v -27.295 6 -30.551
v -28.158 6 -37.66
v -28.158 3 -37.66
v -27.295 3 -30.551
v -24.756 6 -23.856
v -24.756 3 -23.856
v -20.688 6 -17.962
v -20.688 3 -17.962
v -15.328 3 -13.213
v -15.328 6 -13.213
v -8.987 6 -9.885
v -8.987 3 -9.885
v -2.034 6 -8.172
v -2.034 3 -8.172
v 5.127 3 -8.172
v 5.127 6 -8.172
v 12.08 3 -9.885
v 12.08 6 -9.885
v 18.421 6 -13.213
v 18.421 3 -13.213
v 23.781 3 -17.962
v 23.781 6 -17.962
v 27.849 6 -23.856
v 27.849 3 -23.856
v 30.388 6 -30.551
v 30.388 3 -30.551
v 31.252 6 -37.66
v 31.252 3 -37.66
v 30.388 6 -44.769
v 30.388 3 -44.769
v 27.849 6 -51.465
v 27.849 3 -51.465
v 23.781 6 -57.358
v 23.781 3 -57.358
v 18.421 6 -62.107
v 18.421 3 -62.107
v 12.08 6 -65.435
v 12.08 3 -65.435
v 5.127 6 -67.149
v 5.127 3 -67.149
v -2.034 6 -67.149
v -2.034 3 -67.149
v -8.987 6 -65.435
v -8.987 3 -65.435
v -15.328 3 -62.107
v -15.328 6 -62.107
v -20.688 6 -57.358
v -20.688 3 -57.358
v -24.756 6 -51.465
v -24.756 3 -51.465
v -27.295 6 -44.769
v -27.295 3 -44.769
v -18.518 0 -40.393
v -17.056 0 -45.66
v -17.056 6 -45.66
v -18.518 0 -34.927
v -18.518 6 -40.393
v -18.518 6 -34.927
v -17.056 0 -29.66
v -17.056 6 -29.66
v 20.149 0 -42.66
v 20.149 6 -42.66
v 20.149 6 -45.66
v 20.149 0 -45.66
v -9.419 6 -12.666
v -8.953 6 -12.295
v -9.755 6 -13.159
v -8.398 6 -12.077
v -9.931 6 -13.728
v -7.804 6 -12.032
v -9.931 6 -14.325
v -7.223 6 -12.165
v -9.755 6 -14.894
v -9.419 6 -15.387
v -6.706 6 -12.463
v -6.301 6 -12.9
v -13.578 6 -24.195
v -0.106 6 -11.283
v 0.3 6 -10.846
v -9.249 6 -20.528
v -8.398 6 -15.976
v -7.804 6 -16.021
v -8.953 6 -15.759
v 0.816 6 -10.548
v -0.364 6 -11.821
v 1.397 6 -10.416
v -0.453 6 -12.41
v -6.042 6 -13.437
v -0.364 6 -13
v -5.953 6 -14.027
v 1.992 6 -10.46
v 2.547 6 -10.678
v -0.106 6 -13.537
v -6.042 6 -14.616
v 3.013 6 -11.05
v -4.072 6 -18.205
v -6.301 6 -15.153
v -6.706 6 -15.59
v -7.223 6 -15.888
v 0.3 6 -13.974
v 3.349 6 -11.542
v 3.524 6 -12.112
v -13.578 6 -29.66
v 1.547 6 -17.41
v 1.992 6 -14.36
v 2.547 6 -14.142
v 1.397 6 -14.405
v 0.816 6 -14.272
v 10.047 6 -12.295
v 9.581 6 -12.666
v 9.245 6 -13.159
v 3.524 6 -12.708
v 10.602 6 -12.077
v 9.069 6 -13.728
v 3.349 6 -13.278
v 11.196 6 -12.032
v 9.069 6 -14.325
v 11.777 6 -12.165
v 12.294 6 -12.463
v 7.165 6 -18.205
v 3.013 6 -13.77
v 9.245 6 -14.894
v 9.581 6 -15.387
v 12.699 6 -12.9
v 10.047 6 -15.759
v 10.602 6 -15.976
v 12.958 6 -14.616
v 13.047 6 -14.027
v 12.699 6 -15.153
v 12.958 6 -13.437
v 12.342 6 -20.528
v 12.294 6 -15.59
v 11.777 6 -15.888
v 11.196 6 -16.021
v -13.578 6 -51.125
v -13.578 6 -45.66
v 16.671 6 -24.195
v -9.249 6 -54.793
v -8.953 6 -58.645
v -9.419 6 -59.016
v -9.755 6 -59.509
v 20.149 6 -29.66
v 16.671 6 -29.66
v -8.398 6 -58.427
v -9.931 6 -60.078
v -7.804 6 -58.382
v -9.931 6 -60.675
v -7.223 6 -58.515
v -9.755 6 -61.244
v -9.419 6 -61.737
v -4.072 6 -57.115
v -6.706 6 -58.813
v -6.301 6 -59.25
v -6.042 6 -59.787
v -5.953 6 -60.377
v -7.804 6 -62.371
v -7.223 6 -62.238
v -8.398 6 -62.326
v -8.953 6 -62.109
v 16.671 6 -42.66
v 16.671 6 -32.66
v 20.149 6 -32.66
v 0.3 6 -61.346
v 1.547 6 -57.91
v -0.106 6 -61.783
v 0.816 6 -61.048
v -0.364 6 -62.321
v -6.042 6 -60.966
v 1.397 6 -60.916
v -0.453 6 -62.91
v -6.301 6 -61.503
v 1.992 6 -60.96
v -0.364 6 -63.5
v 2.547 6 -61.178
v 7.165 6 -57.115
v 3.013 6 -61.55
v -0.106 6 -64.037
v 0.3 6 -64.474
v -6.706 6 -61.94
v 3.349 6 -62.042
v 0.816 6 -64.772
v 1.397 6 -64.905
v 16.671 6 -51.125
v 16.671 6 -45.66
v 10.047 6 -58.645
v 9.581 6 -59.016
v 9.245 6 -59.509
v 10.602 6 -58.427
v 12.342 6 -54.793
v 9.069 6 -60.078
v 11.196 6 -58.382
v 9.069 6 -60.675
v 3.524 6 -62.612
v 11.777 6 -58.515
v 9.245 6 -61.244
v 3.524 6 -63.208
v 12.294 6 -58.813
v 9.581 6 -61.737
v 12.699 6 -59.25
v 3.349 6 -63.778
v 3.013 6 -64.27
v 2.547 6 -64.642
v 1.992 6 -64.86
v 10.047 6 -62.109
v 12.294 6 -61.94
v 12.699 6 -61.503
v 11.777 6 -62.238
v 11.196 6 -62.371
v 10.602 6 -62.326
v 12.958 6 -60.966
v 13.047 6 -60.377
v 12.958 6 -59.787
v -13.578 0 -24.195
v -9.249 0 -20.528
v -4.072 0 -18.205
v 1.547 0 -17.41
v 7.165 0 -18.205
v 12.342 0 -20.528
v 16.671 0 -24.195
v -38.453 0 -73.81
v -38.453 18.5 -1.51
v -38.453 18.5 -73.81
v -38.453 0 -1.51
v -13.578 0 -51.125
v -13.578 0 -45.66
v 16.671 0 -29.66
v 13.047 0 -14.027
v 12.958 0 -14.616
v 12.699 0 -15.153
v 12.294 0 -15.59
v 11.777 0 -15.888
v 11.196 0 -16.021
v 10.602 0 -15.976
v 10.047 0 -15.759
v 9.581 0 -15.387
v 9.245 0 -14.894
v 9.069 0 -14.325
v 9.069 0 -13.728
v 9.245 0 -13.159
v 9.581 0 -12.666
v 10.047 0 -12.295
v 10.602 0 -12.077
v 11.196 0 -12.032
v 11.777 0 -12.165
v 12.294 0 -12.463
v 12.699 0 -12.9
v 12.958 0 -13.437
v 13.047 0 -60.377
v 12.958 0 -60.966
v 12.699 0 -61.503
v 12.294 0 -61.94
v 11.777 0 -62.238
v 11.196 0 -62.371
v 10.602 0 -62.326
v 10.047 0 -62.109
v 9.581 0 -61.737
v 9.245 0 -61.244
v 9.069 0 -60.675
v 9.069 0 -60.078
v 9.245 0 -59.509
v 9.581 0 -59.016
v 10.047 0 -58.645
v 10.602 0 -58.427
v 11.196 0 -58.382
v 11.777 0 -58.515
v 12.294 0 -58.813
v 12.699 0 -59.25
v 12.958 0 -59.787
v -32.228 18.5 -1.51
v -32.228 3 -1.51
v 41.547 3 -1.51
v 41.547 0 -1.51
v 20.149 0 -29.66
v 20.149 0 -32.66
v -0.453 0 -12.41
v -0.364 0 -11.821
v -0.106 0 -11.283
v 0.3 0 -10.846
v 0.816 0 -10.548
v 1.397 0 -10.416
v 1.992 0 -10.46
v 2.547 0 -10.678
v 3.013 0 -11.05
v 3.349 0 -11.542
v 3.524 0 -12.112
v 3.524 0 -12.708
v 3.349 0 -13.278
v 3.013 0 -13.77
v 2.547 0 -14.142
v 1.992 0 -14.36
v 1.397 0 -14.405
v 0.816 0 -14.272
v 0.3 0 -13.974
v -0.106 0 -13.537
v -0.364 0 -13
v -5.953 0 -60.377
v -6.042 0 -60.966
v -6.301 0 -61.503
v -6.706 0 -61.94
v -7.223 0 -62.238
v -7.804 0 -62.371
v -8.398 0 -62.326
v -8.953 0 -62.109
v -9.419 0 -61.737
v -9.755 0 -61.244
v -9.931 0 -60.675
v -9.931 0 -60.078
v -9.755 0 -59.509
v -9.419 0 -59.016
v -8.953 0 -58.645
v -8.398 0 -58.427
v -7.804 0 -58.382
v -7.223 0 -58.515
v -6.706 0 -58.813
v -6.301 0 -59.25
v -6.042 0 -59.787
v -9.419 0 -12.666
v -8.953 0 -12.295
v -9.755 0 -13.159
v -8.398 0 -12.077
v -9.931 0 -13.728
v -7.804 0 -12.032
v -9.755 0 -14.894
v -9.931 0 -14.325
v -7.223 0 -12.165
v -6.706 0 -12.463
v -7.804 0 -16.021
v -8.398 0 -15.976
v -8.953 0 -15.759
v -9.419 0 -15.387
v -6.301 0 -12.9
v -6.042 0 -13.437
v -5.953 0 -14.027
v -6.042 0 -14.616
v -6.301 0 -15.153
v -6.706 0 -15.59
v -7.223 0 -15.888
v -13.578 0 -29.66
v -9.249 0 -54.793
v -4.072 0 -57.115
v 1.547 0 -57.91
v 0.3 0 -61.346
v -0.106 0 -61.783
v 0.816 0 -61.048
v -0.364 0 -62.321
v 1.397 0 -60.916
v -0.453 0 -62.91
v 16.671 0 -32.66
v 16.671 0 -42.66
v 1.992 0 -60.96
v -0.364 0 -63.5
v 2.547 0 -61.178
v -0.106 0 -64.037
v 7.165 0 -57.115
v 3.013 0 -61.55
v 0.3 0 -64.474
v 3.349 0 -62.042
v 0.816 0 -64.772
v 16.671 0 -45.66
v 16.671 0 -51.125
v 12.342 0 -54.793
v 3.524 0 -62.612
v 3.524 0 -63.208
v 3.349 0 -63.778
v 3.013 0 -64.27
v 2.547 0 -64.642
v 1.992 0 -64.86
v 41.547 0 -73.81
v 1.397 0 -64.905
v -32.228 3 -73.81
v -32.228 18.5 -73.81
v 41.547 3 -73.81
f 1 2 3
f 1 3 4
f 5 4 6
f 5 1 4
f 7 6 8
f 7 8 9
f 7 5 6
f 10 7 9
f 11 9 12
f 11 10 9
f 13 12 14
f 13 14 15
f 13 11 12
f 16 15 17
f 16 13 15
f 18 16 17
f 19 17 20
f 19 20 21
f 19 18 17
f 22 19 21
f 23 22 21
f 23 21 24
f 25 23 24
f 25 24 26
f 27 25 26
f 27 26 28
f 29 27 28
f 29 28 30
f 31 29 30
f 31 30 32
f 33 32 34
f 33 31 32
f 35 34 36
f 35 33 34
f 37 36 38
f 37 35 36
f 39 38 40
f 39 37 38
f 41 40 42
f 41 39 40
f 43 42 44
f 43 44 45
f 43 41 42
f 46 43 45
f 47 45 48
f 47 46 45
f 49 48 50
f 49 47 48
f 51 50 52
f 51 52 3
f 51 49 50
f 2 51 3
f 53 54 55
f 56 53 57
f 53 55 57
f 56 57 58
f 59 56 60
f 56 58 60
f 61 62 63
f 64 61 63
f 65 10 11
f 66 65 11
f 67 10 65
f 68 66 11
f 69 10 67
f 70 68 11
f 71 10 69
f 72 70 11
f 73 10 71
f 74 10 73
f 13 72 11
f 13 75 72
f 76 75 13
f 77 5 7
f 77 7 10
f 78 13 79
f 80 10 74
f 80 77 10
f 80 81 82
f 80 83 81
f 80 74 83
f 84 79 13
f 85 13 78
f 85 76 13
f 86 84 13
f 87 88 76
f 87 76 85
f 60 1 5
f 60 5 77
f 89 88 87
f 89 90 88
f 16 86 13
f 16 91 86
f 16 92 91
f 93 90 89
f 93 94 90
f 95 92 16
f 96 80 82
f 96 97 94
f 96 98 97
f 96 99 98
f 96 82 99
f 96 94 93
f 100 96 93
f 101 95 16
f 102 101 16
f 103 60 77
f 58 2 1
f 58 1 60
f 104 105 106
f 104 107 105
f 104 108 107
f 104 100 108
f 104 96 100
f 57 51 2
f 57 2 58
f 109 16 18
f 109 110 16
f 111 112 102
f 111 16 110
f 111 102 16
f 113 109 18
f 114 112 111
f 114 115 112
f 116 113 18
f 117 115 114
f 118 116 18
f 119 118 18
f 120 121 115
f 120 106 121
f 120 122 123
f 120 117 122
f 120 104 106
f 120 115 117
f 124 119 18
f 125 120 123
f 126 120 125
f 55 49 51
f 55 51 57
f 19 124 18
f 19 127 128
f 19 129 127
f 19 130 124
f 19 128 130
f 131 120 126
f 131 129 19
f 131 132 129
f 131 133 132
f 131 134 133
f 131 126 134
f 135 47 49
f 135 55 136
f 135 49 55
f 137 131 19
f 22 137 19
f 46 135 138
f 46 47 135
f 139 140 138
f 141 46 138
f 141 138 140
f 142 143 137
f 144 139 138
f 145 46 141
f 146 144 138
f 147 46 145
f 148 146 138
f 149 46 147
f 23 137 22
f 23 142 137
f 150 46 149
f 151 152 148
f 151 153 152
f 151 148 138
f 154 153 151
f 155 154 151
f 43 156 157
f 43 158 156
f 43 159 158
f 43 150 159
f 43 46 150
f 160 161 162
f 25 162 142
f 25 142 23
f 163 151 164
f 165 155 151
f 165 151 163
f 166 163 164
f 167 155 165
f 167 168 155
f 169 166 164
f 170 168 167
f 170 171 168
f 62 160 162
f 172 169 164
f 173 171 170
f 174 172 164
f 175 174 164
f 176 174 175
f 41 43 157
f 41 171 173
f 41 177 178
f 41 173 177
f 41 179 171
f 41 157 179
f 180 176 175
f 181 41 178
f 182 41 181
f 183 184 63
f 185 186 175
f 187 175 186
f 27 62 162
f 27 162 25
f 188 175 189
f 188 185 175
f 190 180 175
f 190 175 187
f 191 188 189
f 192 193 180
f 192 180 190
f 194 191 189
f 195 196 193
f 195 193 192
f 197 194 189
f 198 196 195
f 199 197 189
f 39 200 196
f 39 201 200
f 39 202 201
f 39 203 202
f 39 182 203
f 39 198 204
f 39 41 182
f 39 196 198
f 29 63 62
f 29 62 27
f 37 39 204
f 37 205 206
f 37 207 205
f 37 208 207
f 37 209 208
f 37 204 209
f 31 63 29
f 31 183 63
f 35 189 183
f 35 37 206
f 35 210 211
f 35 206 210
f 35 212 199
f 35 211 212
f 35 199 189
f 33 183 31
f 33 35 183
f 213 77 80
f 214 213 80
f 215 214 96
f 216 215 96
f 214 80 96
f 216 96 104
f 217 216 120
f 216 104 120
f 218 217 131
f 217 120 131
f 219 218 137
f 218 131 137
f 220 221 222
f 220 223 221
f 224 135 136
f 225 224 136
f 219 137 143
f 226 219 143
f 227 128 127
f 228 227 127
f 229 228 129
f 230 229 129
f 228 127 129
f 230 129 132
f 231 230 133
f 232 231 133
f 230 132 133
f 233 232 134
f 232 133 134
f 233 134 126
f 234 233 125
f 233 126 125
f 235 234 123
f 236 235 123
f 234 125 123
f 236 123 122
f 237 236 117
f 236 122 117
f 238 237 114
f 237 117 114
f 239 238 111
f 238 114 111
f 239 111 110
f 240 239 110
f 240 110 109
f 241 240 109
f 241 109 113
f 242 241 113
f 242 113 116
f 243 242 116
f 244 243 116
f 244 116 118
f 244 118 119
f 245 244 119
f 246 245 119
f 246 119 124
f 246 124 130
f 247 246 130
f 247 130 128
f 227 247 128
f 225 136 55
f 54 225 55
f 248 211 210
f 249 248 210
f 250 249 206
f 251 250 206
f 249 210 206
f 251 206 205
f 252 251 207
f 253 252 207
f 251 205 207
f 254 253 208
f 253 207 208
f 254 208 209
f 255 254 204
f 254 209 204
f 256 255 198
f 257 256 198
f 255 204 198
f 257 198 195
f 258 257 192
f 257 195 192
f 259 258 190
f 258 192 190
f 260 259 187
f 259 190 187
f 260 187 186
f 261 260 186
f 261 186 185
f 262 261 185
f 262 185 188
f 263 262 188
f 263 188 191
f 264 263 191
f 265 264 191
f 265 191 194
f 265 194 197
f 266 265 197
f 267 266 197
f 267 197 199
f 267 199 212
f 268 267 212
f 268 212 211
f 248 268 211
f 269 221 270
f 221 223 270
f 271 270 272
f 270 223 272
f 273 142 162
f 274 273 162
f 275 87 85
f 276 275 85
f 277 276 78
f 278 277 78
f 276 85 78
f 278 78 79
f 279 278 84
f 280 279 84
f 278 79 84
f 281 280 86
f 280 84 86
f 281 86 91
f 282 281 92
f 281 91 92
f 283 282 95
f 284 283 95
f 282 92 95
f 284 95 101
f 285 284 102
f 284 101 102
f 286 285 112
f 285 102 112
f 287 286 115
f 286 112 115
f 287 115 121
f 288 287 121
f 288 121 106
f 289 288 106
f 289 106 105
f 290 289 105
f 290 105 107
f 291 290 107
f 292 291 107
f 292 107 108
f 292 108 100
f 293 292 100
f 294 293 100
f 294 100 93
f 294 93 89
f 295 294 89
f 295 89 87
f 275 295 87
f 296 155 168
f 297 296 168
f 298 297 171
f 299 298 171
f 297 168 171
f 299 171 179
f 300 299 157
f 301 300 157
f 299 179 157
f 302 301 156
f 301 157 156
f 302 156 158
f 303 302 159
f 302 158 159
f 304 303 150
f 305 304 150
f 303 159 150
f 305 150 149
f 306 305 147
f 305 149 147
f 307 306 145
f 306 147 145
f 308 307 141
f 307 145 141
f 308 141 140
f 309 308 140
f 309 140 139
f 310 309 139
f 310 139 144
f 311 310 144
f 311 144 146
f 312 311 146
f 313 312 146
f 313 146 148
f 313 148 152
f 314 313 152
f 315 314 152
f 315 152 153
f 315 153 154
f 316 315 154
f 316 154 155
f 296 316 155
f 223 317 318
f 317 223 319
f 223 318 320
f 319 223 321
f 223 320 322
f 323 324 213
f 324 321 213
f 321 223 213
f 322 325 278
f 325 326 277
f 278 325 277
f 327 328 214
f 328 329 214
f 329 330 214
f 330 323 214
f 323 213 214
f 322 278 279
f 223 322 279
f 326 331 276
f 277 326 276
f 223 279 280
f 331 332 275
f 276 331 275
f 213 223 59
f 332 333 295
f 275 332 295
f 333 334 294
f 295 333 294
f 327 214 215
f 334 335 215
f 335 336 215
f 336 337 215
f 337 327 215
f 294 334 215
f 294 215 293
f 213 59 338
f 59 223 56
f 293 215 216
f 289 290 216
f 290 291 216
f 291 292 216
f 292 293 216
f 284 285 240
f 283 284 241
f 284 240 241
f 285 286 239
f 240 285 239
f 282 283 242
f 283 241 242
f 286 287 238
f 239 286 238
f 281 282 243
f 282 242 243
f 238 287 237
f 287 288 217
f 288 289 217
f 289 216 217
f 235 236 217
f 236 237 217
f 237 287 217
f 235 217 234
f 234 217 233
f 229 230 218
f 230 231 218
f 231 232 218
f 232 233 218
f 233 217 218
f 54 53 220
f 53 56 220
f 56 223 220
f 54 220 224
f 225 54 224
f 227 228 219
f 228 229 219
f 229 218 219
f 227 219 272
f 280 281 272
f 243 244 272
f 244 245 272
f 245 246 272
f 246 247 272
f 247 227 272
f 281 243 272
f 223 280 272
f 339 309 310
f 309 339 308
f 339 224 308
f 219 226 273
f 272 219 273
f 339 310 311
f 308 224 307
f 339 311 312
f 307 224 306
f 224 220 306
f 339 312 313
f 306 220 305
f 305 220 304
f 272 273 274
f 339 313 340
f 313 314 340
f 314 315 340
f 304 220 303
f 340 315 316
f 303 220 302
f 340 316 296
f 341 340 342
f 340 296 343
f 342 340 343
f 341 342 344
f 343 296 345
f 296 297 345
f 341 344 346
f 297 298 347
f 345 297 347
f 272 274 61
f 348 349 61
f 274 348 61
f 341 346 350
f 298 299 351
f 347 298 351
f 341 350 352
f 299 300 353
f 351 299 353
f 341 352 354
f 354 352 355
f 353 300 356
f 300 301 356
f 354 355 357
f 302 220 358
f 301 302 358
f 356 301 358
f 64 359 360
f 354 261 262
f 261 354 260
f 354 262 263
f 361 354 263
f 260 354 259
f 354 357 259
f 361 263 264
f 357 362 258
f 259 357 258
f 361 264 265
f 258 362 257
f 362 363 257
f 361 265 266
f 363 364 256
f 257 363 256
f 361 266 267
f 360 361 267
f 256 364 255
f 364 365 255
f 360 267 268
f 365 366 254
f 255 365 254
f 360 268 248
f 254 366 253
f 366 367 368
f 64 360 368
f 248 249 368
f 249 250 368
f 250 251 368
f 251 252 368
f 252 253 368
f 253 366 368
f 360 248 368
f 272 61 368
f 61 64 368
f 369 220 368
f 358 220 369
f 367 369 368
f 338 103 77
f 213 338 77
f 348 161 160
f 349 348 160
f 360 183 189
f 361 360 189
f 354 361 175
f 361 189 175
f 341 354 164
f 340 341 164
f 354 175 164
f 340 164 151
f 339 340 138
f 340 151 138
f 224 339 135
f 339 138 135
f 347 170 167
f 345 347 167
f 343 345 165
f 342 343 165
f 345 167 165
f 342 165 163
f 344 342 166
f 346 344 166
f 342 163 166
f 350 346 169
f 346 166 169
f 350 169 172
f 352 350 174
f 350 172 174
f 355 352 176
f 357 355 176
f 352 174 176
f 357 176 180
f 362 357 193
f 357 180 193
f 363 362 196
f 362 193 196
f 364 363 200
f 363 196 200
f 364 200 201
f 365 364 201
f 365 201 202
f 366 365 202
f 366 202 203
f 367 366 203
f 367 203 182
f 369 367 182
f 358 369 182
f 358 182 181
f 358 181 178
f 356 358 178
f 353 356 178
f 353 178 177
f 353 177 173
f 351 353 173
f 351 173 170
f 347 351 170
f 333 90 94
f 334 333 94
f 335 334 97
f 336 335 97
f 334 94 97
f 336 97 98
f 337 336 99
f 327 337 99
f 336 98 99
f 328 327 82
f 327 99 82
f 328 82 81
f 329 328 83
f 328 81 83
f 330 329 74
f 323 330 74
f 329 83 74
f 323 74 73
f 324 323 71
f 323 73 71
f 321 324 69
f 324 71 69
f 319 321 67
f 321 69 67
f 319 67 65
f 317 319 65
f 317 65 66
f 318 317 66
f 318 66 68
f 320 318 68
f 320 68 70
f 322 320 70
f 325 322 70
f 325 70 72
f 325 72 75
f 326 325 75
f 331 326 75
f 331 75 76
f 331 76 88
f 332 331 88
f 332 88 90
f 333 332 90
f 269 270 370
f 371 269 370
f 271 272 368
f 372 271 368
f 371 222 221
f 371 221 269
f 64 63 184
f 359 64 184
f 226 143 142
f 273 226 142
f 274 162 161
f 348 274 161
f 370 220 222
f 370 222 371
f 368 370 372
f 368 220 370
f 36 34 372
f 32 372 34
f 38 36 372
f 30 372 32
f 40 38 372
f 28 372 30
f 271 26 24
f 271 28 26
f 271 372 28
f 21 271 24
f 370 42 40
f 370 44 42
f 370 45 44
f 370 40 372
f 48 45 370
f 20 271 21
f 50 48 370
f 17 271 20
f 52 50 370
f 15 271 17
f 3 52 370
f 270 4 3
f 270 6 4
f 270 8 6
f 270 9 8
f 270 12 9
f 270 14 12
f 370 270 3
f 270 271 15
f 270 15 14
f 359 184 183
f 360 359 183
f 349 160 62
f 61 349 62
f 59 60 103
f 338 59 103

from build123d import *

# Parameters (mm, degrees)
SKETCH1_W           = 80
SKETCH1_H           = 72.3
BOSS_EXTRUDE1_DEPTH = 6
SKETCH2_W           = 80
SKETCH2_H           = 72.3
SKETCH2_R           = 29.705
CUT_EXTRUDE1_DEPTH  = 3
CUT_EXTRUDE3_DEPTH  = 7
SKETCH5_R           = 2
CUT_EXTRUDE4_DEPTH  = 7
SKETCH6_R           = 2
CUT_EXTRUDE5_DEPTH  = 7
SKETCH8_W           = 6.225749038
SKETCH8_H           = 72.3
BOSS_EXTRUDE2_DEPTH = 15.5


with BuildPart() as part:
    # Sketch1 → Boss-Extrude1 (new body)
    with BuildSketch(Plane(origin=(0, 0, 0), x_dir=(1, 0, 0), z_dir=(0, 1, 0))):
        with Locations((1.546657586, 37.660128709)):
            Rectangle(SKETCH1_W, SKETCH1_H)
    extrude(amount=BOSS_EXTRUDE1_DEPTH)

    # Sketch2 → Cut-Extrude1 (cut)
    with BuildSketch(Plane(origin=(0, 6, 0), x_dir=(-1, 0, 0), z_dir=(0, 1, 0))):
        with Locations((-1.546657586, -37.660128709)):
            Rectangle(SKETCH2_W, SKETCH2_H)
        with Locations((-1.546657586, -37.660128709)):
            Circle(SKETCH2_R, mode=Mode.SUBTRACT)
    extrude(amount=-CUT_EXTRUDE1_DEPTH, mode=Mode.SUBTRACT)

    # Sketch3 → Cut-Extrude3 (cut, through all)
    with BuildSketch(Plane(origin=(0, 6, 0), x_dir=(-1, 0, 0), z_dir=(0, 1, 0))):
        with BuildLine():
            ThreePointArc((-16.671348492, -51.125128709), (-1.546657586, -57.910128709), (13.57803332, -51.125128709))
            Line((13.57803332, -51.125128709), (13.57803332, -45.660128709))
            Line((13.57803332, -45.660128709), (17.056097586, -45.660128709))
            ThreePointArc((17.056097586, -45.660128709), (18.703342414, -37.660128709), (17.056097586, -29.660128709))
            Line((17.056097586, -29.660128709), (13.57803332, -29.660128709))
            Line((13.57803332, -29.660128709), (13.57803332, -24.195128709))
            ThreePointArc((13.57803332, -24.195128709), (-1.546657586, -17.410128709), (-16.671348492, -24.195128709))
            Line((-16.671348492, -24.195128709), (-16.671348492, -29.660128709))
            Line((-16.671348492, -29.660128709), (-20.149412759, -29.660128709))
            Line((-20.149412759, -29.660128709), (-20.149412759, -32.660128709))
            Line((-20.149412759, -32.660128709), (-16.671348492, -32.660128709))
            Line((-16.671348492, -32.660128709), (-16.671348492, -42.660128709))
            Line((-16.671348492, -42.660128709), (-20.149412759, -42.660128709))
            Line((-20.149412759, -42.660128709), (-20.149412759, -45.660128709))
            Line((-20.149412759, -45.660128709), (-16.671348492, -45.660128709))
            Line((-16.671348492, -45.660128709), (-16.671348492, -51.125128709))
        make_face()
    extrude(amount=-CUT_EXTRUDE3_DEPTH, mode=Mode.SUBTRACT)

    # Sketch5 → Cut-Extrude4 (cut, through all)
    with BuildSketch(Plane(origin=(0, 6, 0), x_dir=(-1, 0, 0), z_dir=(0, 1, 0))):
        with Locations((-1.546657586, -12.410128709)):
            Circle(SKETCH5_R)
        with Locations((-1.546657586, -62.910128709)):
            Circle(SKETCH5_R)
    extrude(amount=-CUT_EXTRUDE4_DEPTH, mode=Mode.SUBTRACT)

    # Sketch6 → Cut-Extrude5 (cut, through all)
    with BuildSketch(Plane(origin=(0, 6, 0), x_dir=(1, 0, 0), z_dir=(0, 1, 0))):
        with Locations((-7.953342414, 60.376565813)):
            Circle(SKETCH6_R)
        with Locations((11.046657586, 60.376565813)):
            Circle(SKETCH6_R)
        with Locations((11.046657586, 14.026565813)):
            Circle(SKETCH6_R)
        with Locations((-7.953342414, 14.026565813)):
            Circle(SKETCH6_R)
    extrude(amount=-CUT_EXTRUDE5_DEPTH, mode=Mode.SUBTRACT)

    # Sketch8 → Boss-Extrude2 (add)
    with BuildSketch(Plane(origin=(0, 3, 0), x_dir=(1, 0, 0), z_dir=(0, 1, 0))):
        with Locations((-35.340467895, 37.660128709)):
            Rectangle(SKETCH8_W, SKETCH8_H)
    extrude(amount=BOSS_EXTRUDE2_DEPTH)


solid = part.part
